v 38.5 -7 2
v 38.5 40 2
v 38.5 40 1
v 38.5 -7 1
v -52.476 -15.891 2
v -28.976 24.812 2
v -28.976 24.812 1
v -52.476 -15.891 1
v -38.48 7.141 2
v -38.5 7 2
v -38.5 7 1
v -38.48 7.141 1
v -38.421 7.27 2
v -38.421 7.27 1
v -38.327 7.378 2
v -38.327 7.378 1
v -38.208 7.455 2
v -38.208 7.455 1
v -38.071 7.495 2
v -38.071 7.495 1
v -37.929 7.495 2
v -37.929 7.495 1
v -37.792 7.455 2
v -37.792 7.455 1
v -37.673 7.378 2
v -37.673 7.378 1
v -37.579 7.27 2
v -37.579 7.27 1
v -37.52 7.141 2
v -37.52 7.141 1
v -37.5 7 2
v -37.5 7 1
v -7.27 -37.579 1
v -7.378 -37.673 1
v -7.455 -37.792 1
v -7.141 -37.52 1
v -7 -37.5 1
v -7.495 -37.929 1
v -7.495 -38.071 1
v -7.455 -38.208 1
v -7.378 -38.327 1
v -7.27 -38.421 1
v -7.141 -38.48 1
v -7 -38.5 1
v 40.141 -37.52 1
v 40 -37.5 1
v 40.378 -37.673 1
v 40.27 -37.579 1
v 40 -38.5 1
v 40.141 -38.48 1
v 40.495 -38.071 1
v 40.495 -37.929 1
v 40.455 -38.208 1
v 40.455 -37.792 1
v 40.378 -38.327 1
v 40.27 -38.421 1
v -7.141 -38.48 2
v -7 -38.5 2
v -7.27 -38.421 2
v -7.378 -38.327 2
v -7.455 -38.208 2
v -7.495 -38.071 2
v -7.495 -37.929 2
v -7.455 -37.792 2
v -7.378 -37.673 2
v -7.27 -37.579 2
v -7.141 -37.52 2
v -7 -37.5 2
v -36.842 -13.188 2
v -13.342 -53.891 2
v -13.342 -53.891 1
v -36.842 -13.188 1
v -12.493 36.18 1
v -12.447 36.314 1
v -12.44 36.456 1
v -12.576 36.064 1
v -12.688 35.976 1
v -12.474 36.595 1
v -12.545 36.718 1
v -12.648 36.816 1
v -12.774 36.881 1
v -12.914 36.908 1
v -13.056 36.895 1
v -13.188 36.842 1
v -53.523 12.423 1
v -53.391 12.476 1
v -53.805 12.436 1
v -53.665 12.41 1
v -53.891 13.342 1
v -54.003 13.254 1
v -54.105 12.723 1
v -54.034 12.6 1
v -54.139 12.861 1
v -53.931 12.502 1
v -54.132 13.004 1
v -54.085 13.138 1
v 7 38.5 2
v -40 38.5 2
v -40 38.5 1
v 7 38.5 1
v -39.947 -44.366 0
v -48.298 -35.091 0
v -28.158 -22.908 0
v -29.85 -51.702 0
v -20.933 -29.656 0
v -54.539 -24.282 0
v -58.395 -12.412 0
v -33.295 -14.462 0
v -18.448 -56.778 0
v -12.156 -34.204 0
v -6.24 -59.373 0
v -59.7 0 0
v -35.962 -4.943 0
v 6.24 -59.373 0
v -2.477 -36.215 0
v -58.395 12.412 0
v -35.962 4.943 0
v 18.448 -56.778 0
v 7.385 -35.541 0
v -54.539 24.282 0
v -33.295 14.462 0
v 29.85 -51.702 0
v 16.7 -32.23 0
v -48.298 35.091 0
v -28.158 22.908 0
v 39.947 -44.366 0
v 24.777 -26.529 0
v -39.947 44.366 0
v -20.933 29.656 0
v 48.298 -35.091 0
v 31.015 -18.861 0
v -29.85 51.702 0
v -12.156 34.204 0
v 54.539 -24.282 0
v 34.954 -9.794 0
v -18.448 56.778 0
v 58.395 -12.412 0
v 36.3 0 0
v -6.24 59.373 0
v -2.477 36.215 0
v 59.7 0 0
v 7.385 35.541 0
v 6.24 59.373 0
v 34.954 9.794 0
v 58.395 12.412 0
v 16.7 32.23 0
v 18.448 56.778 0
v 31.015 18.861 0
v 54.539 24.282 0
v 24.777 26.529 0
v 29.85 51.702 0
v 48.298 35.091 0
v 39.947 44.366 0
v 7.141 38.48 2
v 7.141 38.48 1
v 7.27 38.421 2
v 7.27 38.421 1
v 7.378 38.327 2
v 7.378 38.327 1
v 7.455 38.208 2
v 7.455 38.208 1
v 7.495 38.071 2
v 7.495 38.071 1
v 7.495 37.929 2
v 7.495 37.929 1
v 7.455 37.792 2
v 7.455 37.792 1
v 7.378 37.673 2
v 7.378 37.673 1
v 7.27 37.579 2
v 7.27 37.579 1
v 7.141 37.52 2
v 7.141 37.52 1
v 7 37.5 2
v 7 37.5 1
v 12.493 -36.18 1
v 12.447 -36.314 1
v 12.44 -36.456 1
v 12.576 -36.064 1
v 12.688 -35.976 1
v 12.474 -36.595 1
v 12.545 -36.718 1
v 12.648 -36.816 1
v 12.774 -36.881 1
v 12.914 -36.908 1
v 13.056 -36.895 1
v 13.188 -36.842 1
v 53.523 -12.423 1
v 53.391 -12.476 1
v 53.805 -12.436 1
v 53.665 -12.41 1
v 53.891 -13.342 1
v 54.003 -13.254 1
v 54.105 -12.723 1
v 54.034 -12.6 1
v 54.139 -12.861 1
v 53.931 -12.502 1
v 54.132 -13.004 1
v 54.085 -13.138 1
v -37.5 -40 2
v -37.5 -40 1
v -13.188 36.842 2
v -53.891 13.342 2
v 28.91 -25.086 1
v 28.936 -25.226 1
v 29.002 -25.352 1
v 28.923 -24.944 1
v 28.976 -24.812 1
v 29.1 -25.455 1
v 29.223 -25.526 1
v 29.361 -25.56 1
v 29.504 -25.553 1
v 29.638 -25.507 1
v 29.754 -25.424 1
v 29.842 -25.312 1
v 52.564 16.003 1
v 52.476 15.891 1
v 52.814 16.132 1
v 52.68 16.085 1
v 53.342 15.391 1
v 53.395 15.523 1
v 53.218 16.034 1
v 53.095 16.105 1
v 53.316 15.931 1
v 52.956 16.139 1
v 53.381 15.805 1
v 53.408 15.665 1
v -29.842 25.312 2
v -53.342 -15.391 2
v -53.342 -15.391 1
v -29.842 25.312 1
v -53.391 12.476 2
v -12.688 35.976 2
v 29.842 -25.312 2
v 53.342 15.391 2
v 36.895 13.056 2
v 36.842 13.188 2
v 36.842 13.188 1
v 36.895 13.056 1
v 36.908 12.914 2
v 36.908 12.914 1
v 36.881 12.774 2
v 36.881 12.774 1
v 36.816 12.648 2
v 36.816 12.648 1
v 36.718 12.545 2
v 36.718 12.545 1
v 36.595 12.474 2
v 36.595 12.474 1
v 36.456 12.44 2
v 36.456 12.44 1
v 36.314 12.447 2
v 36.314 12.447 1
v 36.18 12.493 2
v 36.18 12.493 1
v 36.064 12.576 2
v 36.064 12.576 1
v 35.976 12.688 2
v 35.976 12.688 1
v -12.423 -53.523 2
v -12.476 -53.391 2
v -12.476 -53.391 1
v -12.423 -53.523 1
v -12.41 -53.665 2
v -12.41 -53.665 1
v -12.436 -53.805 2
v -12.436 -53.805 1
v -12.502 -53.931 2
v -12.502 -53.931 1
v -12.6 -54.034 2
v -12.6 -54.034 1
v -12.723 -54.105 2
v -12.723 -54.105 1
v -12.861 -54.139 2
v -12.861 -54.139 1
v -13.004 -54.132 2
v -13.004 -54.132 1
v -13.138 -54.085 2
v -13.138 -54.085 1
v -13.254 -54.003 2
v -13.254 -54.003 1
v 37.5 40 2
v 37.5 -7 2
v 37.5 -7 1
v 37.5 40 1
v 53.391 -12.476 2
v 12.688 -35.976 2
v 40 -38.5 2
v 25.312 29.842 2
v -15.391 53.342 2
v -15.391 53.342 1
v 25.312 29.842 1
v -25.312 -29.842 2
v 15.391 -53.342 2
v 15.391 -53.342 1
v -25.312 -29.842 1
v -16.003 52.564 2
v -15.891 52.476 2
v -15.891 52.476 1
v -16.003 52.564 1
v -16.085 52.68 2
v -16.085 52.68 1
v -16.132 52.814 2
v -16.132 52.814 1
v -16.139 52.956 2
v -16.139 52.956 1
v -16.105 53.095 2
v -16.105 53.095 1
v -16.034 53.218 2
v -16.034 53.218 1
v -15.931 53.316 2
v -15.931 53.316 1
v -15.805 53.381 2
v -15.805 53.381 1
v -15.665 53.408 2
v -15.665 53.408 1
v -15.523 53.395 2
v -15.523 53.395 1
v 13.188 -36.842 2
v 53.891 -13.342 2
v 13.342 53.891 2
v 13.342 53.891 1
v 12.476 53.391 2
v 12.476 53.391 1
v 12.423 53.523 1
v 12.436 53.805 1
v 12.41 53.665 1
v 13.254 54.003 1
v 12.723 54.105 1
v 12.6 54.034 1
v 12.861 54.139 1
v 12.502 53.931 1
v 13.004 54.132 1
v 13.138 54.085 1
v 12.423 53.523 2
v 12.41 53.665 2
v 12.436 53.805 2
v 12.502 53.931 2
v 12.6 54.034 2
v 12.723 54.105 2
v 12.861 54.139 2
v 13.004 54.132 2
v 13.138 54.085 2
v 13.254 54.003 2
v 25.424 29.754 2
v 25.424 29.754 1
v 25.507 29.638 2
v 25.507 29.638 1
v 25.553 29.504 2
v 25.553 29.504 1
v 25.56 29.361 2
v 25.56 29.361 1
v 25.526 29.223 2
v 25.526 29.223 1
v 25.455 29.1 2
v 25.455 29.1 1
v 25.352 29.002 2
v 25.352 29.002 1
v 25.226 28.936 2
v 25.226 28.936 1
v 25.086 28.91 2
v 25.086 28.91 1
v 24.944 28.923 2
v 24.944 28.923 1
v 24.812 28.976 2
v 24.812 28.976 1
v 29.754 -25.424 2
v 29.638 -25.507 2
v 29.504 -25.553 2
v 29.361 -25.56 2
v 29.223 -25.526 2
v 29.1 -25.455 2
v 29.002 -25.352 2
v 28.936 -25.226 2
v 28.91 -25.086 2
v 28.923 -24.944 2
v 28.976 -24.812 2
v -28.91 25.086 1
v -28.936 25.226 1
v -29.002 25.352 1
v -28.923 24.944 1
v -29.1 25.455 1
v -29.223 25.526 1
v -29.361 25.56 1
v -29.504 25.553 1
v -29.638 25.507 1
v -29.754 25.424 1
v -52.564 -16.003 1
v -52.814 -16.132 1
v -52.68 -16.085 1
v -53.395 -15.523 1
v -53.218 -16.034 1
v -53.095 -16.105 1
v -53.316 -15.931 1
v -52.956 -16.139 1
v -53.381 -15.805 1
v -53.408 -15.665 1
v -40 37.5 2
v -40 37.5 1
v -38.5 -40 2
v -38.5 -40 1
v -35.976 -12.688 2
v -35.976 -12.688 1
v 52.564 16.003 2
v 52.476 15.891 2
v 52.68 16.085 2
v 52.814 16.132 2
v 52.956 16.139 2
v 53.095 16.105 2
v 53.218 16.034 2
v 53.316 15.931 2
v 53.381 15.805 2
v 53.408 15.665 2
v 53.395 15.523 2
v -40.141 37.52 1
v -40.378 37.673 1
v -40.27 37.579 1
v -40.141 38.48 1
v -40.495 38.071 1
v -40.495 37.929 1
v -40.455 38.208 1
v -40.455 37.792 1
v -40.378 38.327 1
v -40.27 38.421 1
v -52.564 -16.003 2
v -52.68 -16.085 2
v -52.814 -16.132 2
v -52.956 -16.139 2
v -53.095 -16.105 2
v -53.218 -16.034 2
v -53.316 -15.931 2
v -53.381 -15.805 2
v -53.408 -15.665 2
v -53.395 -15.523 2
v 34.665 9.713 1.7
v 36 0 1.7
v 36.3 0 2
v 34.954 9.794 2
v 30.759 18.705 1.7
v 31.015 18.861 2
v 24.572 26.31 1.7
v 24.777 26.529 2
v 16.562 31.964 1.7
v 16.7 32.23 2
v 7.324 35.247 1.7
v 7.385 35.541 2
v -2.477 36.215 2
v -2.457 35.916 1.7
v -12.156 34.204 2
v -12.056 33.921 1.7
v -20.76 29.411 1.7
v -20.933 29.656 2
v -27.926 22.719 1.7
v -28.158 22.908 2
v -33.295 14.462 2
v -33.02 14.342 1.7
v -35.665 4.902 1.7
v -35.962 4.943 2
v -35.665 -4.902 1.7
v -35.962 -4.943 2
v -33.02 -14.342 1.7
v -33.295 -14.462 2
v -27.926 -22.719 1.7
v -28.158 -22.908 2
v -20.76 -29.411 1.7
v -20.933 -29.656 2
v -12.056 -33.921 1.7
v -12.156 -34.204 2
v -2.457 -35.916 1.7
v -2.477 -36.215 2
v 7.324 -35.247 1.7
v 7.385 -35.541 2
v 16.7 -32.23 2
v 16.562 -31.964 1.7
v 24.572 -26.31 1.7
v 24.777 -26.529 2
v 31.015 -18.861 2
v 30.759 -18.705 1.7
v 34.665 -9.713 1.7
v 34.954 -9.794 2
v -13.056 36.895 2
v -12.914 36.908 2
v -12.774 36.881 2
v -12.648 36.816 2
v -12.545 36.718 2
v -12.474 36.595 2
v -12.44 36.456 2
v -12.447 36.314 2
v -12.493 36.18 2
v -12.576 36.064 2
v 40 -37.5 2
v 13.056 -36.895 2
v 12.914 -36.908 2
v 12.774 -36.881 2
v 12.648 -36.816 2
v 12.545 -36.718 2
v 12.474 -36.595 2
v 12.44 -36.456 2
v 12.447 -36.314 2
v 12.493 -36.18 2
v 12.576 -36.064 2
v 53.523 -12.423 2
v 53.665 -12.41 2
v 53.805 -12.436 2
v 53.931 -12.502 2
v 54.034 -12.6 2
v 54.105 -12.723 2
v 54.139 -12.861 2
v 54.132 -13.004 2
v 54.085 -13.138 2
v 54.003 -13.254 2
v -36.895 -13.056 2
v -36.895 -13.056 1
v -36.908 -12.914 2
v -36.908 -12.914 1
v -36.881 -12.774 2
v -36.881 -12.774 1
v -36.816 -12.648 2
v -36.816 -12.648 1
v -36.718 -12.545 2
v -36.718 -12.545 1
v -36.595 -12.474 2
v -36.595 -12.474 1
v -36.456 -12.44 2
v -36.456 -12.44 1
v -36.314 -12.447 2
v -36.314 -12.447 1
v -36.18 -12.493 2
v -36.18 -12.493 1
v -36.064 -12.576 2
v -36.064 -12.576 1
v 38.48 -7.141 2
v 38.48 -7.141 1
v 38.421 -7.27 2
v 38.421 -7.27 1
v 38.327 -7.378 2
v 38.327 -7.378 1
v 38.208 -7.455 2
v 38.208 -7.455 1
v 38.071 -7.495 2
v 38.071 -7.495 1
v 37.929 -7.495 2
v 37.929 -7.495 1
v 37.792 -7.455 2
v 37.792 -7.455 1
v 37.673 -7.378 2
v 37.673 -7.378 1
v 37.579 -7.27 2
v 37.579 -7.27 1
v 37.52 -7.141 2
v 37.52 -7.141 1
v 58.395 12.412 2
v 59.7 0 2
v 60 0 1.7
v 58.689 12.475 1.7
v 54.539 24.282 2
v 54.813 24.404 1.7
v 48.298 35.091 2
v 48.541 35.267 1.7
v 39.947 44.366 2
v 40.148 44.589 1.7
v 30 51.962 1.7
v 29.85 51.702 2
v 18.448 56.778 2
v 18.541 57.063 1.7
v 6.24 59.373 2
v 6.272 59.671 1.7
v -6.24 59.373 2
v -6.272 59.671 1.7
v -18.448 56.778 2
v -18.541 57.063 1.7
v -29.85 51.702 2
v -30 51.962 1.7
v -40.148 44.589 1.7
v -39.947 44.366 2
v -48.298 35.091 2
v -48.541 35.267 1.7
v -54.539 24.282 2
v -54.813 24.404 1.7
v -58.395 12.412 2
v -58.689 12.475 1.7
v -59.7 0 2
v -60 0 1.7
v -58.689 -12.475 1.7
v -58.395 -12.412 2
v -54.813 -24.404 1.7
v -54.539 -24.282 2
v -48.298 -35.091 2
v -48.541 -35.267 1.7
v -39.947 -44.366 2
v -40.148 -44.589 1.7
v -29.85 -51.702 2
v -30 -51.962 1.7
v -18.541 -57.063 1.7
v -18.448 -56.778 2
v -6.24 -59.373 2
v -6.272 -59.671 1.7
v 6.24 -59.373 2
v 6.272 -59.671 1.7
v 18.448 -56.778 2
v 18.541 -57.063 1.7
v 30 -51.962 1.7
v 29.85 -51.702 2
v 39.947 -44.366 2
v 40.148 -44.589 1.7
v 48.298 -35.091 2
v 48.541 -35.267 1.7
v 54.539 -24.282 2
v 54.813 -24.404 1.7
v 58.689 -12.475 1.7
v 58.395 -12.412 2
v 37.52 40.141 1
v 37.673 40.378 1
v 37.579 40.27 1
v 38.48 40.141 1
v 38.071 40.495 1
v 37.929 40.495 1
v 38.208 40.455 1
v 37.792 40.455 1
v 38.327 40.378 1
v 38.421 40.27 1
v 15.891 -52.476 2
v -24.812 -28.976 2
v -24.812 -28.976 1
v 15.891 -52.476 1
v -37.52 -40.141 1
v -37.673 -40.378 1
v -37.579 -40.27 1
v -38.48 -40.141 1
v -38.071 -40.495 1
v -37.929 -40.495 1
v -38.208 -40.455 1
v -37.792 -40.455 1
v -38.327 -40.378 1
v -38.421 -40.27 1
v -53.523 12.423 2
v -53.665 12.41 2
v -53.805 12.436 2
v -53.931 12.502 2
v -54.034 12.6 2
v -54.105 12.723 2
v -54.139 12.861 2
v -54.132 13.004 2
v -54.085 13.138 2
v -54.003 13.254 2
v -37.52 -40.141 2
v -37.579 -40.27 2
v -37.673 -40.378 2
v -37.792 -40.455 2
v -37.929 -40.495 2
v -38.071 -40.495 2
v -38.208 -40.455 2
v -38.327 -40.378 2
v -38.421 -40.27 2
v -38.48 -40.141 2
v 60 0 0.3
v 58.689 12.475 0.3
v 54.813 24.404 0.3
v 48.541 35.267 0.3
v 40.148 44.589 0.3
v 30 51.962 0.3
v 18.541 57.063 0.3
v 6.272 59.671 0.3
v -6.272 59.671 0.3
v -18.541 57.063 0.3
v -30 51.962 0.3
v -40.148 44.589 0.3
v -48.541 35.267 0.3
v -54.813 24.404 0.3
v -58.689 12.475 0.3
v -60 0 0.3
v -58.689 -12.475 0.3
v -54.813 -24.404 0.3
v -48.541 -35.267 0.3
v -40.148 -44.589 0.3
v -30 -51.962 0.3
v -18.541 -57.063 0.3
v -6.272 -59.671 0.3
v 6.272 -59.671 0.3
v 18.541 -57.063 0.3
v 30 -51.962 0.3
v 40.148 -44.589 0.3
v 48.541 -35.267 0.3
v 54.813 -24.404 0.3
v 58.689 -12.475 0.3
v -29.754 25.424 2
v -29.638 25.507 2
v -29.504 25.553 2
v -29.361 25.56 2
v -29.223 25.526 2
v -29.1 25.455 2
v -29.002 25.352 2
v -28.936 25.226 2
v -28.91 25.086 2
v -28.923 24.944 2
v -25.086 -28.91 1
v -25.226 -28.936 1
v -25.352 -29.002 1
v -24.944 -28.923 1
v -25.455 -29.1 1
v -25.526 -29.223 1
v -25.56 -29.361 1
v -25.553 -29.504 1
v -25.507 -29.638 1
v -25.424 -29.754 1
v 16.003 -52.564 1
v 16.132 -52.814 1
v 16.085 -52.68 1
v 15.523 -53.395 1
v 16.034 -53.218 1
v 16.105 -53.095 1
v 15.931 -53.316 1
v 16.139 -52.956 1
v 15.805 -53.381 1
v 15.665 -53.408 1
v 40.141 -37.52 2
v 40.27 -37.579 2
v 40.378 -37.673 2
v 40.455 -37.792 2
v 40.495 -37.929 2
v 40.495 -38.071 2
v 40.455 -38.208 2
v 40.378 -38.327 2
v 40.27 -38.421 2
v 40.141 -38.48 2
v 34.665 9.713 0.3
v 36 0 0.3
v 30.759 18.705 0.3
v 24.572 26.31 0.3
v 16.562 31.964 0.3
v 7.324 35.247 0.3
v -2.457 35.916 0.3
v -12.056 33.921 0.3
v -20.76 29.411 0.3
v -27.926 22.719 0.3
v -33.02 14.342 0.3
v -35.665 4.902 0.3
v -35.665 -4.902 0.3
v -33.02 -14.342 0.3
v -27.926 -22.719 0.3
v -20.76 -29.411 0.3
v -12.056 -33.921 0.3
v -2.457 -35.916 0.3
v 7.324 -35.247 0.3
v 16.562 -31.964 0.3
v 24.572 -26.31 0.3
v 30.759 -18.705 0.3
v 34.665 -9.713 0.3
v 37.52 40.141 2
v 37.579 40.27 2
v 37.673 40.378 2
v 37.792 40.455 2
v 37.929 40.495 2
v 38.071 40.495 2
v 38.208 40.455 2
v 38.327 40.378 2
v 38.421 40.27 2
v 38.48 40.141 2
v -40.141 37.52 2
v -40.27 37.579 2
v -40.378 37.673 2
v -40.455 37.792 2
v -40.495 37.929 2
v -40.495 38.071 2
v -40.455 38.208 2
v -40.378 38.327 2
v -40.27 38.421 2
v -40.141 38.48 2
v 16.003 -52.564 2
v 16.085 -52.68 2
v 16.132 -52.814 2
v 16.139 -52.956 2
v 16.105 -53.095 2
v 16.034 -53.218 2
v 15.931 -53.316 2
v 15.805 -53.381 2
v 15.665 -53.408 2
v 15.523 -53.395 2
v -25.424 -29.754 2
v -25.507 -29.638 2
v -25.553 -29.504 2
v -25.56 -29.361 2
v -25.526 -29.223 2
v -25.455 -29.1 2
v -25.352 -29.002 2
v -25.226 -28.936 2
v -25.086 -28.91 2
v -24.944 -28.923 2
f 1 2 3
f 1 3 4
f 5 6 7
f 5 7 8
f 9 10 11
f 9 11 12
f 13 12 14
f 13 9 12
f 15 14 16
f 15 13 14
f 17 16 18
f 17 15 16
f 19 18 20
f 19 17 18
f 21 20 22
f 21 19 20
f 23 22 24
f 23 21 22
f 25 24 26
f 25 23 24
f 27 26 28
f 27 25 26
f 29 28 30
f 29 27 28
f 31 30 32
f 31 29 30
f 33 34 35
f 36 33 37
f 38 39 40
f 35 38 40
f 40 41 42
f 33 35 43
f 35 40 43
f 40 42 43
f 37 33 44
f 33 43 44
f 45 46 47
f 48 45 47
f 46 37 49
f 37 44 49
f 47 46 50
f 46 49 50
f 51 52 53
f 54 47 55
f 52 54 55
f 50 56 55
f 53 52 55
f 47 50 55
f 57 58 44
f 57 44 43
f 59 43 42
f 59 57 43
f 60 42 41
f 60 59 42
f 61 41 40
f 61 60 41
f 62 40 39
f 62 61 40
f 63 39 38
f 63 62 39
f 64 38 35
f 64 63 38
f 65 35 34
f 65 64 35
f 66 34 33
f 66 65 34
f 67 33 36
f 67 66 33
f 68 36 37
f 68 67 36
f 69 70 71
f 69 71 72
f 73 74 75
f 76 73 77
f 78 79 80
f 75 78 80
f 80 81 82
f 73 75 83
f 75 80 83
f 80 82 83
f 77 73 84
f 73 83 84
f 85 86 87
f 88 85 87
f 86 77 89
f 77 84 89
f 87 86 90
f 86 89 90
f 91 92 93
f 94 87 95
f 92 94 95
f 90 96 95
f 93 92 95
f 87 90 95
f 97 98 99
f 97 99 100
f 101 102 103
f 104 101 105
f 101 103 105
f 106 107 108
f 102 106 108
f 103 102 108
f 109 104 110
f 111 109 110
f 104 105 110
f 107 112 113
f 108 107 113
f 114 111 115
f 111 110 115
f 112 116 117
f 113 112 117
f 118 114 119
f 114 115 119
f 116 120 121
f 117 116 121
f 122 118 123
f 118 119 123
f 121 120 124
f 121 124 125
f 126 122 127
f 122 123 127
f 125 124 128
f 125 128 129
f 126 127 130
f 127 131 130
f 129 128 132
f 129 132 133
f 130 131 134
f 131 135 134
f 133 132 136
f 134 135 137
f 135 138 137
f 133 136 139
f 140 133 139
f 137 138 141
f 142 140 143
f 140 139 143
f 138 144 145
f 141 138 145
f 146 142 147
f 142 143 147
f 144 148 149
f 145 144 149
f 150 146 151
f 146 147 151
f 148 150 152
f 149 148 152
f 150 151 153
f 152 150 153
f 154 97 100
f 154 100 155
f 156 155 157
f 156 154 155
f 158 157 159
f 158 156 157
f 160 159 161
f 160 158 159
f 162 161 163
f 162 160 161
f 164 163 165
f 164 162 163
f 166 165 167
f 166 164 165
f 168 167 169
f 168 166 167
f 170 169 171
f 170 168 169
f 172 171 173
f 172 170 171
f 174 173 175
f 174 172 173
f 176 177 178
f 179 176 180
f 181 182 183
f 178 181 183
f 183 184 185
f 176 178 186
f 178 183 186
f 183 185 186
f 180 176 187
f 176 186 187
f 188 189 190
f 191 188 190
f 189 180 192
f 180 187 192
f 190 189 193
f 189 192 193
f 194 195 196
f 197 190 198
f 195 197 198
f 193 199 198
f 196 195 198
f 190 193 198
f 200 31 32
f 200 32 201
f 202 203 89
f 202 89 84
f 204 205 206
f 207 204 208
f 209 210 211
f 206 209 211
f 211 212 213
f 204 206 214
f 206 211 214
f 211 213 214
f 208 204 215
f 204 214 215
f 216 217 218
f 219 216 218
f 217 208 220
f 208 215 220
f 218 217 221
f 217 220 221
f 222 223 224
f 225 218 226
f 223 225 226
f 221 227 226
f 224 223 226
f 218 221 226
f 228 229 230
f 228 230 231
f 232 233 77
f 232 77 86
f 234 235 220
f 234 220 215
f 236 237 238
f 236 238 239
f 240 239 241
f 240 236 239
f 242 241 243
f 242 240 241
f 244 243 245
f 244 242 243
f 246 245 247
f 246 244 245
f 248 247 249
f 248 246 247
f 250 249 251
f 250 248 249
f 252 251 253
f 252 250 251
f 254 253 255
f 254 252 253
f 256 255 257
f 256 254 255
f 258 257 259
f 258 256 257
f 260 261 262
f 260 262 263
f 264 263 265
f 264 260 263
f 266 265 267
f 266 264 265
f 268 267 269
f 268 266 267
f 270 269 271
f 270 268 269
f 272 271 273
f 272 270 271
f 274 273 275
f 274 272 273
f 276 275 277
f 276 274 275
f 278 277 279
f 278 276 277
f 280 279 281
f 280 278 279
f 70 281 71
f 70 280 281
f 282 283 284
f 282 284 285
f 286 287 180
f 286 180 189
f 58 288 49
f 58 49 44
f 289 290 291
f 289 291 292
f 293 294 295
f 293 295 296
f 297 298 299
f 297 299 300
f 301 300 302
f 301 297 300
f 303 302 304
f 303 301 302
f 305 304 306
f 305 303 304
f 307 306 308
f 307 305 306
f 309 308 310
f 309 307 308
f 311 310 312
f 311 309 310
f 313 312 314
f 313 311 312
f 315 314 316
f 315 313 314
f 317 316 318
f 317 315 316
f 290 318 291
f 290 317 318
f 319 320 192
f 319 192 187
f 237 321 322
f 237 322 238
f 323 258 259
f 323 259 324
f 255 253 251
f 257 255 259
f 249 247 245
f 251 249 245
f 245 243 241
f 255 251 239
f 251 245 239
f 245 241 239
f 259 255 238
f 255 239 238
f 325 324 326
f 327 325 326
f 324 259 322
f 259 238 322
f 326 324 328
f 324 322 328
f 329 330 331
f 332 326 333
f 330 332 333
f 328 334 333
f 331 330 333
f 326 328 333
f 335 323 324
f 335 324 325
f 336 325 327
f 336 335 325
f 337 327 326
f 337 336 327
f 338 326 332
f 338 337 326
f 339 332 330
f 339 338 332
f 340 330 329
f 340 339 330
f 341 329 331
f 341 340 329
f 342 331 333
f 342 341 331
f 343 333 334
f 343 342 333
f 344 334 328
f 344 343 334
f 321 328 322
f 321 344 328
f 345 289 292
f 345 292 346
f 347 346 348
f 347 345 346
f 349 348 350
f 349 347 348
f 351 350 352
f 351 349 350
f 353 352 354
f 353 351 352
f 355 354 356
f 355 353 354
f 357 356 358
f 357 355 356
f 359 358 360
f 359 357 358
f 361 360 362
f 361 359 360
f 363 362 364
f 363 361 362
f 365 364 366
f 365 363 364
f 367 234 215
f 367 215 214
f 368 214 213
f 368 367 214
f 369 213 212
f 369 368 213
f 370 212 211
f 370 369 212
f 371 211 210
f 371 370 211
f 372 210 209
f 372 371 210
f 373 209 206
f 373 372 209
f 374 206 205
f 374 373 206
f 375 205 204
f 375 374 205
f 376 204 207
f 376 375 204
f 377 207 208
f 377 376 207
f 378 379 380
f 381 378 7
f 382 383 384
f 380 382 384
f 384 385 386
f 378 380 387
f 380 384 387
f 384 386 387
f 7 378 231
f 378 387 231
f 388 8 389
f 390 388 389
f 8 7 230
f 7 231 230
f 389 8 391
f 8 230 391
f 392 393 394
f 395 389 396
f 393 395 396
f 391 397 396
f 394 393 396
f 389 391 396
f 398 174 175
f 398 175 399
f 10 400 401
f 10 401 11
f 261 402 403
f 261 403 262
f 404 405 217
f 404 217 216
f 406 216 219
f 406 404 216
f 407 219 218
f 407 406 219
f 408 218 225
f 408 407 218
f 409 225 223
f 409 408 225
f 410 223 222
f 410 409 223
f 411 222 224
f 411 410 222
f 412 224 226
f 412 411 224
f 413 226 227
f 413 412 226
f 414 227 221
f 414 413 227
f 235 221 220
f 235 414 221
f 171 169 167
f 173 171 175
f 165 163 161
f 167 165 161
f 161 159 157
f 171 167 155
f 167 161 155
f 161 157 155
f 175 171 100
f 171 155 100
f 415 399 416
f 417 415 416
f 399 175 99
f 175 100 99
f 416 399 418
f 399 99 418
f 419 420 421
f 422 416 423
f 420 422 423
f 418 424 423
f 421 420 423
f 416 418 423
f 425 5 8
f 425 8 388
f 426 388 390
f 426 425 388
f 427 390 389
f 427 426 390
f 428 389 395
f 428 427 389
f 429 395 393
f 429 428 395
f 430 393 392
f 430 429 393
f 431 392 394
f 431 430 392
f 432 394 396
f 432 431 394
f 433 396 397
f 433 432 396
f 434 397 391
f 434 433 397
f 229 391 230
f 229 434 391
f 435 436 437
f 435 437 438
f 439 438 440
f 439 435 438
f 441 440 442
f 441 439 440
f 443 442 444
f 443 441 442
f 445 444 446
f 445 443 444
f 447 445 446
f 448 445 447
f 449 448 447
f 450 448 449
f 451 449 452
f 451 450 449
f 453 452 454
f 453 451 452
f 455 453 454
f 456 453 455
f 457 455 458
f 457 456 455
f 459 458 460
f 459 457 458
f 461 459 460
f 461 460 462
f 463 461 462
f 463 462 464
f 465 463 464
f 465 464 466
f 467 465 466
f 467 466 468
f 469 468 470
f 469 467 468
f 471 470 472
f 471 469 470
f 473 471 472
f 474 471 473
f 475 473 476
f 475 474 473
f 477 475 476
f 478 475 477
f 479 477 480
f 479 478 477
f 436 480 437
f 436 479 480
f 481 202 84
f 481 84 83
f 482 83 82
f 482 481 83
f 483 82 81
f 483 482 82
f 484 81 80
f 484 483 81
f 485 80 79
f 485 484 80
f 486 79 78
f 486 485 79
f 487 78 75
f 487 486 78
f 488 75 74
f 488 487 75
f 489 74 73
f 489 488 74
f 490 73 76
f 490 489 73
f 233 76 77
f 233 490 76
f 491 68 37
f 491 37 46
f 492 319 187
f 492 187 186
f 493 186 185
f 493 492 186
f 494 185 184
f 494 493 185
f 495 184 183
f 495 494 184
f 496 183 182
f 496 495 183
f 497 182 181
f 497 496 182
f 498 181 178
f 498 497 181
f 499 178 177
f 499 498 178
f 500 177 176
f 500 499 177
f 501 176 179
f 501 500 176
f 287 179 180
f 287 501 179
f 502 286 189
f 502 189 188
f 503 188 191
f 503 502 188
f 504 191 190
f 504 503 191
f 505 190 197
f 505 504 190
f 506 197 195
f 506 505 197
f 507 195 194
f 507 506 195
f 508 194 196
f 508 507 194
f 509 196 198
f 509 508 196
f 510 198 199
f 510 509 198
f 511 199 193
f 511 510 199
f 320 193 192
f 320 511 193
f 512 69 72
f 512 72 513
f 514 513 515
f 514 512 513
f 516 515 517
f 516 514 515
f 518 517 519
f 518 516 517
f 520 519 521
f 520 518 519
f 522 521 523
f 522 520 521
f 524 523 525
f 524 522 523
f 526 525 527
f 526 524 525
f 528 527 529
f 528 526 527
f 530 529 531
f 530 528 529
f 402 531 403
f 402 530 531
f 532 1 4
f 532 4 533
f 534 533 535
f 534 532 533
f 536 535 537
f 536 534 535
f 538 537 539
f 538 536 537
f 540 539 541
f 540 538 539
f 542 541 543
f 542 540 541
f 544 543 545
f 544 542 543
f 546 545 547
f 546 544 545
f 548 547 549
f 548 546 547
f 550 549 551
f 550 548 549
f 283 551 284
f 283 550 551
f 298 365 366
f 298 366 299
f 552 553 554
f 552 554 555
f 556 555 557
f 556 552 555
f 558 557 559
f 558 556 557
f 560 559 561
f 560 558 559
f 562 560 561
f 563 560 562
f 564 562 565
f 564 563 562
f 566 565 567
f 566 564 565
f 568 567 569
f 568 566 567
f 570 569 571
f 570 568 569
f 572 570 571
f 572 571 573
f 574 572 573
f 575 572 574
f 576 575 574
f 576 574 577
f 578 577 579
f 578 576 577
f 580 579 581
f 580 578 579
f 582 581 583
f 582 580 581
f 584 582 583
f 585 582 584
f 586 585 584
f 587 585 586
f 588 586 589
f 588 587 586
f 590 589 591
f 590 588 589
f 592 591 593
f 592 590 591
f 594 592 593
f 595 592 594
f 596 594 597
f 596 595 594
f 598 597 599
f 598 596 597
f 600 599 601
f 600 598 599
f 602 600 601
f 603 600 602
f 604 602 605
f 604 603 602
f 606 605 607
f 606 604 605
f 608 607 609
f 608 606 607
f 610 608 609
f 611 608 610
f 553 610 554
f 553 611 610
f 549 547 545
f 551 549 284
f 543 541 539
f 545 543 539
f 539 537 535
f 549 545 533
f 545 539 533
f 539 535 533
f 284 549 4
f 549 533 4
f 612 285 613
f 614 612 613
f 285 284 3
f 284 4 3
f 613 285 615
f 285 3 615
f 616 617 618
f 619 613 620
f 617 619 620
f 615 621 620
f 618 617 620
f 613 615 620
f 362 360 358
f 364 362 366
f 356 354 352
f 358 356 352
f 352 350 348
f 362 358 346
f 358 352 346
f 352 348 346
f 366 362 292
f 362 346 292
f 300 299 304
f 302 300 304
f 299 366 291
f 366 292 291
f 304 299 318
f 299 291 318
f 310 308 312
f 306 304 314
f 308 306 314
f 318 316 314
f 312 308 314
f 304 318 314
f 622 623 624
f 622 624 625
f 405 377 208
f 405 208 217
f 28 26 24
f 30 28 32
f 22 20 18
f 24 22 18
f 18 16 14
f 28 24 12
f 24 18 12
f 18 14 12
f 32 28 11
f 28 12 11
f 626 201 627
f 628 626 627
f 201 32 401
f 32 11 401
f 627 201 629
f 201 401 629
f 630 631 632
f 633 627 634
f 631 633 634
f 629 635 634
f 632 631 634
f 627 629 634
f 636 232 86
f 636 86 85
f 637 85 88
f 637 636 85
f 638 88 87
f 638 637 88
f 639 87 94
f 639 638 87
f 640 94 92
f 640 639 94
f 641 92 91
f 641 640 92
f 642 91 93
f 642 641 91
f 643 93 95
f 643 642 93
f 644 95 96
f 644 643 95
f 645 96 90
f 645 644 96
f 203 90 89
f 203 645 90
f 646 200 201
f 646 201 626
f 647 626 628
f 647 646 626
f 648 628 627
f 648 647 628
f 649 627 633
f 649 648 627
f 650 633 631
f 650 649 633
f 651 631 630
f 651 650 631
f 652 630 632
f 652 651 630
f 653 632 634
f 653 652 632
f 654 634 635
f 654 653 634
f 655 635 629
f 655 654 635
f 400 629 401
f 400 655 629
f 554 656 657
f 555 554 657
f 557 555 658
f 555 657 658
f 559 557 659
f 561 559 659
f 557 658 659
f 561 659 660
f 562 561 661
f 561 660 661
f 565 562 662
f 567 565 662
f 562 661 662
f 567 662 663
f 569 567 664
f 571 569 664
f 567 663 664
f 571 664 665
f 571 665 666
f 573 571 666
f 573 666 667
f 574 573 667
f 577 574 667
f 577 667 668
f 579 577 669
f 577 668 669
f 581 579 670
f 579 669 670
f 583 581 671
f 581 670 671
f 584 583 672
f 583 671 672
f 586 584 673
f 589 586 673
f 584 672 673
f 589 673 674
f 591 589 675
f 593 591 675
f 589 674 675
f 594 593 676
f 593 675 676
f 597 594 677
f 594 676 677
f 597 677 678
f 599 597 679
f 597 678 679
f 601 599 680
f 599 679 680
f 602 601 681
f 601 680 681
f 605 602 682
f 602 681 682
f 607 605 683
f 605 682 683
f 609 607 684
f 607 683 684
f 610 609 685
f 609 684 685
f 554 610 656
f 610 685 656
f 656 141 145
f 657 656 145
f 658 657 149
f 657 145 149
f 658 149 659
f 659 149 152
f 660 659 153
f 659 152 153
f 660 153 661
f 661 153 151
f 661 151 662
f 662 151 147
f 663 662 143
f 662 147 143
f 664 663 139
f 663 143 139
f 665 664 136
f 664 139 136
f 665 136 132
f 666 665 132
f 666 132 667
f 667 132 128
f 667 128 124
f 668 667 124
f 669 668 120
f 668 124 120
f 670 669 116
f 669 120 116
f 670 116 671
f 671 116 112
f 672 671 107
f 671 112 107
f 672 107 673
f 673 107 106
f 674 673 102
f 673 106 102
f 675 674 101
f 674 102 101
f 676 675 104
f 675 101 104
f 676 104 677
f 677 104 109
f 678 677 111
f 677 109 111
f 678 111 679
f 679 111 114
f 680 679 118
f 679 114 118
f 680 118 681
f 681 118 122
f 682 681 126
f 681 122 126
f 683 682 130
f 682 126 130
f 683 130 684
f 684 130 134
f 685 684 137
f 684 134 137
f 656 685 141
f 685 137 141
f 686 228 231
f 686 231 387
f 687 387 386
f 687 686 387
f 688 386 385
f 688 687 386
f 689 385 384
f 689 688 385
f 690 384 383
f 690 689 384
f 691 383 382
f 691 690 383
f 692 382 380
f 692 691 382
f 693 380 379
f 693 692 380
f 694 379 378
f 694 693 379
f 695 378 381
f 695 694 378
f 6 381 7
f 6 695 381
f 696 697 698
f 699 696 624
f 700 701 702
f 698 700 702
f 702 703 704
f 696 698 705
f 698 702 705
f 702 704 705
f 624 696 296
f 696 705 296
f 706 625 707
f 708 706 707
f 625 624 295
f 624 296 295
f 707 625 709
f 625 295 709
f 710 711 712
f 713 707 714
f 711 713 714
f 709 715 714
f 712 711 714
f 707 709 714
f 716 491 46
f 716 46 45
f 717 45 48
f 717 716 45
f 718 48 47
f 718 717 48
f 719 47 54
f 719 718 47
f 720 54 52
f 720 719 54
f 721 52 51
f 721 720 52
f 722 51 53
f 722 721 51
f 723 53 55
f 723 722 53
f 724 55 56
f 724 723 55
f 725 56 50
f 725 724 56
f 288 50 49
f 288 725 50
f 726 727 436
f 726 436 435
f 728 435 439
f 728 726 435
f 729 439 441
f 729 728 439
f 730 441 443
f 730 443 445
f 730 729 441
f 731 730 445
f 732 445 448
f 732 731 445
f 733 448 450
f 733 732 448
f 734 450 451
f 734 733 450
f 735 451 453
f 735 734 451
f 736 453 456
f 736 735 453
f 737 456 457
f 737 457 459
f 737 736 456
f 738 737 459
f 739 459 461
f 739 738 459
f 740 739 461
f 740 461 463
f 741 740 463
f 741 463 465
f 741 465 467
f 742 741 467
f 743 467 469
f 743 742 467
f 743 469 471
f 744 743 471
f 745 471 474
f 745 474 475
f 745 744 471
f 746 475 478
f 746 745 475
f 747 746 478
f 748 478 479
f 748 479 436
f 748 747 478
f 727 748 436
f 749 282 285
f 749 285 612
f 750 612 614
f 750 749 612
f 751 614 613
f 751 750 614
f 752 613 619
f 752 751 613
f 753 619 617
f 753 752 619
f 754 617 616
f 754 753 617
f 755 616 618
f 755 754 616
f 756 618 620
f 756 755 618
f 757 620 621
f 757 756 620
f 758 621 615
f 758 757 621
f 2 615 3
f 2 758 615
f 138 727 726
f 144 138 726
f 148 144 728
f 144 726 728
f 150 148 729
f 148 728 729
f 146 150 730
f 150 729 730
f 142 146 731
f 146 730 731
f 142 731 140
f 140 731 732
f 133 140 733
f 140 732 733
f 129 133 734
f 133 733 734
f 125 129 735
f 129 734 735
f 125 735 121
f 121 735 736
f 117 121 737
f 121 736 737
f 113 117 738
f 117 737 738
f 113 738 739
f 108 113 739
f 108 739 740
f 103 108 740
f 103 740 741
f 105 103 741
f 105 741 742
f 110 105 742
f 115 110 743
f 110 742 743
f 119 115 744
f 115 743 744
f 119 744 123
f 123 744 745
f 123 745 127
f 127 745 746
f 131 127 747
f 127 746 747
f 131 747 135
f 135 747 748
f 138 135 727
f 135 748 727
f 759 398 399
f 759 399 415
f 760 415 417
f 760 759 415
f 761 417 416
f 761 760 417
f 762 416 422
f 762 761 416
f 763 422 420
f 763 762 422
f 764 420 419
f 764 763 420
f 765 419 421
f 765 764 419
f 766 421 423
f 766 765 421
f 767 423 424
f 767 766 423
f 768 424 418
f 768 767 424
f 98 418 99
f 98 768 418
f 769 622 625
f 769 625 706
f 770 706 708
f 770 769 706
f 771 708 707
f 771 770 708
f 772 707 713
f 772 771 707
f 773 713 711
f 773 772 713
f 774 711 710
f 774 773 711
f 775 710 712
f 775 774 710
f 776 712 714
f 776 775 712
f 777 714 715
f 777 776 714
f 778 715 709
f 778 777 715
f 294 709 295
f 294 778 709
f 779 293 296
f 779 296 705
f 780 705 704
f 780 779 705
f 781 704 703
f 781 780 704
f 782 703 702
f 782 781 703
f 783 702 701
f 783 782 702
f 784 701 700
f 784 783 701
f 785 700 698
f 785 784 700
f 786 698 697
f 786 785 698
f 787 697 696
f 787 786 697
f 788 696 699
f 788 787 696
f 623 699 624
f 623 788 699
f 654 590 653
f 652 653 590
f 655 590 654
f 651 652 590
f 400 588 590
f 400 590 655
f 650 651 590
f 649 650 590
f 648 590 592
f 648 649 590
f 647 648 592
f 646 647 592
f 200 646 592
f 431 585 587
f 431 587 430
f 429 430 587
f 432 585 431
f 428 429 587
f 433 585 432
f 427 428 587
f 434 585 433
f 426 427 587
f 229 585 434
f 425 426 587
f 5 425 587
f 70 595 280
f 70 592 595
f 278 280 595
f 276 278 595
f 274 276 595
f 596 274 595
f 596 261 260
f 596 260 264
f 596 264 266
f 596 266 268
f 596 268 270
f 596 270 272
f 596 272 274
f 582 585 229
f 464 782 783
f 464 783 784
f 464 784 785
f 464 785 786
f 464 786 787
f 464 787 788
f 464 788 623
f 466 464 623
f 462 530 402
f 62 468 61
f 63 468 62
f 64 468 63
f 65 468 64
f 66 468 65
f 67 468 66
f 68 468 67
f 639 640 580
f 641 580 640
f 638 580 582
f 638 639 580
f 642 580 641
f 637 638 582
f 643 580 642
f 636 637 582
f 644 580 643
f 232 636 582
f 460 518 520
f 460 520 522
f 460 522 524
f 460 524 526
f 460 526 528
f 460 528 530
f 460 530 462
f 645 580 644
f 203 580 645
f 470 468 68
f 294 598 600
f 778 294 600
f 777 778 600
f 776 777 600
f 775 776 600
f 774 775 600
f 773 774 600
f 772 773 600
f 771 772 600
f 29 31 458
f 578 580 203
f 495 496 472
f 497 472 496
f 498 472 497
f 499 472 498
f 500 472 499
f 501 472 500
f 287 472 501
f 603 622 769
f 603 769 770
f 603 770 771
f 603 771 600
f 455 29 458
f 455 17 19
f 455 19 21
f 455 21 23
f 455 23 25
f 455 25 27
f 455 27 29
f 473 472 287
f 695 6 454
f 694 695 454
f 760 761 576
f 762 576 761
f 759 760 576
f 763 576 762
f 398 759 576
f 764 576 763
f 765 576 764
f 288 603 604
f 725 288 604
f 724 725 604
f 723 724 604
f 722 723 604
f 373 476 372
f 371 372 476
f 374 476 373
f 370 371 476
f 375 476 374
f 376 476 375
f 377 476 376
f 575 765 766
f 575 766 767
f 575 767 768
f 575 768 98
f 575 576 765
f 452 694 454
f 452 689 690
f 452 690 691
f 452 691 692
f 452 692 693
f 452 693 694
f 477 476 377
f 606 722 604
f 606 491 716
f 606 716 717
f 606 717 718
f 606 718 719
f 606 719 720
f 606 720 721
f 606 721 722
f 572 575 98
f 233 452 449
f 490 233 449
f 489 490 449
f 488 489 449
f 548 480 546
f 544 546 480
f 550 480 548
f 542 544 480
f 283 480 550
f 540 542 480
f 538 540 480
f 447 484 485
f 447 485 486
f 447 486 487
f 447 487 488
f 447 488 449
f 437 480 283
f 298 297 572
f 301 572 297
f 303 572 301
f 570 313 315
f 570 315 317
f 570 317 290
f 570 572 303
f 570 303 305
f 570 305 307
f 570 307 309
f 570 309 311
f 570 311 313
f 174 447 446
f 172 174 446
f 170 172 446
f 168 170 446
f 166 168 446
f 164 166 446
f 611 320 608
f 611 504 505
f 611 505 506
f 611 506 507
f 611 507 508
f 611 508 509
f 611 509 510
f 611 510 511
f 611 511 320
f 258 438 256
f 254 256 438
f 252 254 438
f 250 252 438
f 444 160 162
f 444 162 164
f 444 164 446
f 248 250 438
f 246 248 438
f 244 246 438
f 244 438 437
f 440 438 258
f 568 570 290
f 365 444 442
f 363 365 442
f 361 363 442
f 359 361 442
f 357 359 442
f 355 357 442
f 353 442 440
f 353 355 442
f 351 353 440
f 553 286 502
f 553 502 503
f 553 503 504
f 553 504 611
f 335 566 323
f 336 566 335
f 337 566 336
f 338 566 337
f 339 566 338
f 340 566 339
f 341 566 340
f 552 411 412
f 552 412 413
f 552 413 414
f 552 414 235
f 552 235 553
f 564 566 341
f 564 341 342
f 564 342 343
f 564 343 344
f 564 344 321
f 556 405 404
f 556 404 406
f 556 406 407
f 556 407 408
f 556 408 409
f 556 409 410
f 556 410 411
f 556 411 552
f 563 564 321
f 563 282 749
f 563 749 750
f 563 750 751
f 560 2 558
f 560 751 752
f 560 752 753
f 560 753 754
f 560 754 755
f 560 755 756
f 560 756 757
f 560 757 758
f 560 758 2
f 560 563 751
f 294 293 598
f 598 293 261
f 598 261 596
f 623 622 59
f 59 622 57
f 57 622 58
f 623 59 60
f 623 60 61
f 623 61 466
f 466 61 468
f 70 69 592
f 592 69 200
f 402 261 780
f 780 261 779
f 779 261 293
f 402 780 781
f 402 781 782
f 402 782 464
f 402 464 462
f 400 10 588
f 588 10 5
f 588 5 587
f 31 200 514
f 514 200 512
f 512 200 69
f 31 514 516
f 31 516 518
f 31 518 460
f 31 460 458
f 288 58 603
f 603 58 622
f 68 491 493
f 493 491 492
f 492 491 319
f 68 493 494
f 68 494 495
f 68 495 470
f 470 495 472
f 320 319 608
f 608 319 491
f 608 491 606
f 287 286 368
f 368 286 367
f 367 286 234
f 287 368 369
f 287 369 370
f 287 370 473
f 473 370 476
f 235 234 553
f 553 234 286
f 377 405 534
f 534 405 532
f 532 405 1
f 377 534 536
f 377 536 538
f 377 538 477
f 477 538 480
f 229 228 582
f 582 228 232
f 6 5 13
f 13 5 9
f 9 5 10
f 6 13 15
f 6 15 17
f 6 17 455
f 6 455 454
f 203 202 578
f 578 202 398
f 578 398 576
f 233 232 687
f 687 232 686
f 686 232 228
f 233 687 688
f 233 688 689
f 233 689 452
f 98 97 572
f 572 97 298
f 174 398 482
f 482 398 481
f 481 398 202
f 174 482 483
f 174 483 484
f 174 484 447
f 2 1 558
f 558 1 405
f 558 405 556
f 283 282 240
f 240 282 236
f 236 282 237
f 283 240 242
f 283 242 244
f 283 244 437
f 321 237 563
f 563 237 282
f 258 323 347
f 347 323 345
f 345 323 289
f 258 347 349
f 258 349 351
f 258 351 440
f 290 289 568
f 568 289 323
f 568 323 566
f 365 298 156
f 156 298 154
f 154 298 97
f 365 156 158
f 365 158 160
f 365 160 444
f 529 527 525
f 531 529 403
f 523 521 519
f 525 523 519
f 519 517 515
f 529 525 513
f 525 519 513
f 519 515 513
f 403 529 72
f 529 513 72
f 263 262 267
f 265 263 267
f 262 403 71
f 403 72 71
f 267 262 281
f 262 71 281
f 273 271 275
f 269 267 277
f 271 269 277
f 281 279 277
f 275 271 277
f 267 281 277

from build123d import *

# Parameters (mm, degrees)
SKETCH1_R           = 60
SKETCH1_R_2         = 36
BOSS_EXTRUDE1_DEPTH = 2
CUT_EXTRUDE1_DEPTH  = 1
CIRPATTERN1_COUNT   = 12
CHAMFER1_SIZE       = 0.3


with BuildPart() as part:
    # Sketch1 → Boss-Extrude1 (new body)
    with BuildSketch(Plane.XY):
        Circle(SKETCH1_R)
        Circle(SKETCH1_R_2, mode=Mode.SUBTRACT)
    extrude(amount=BOSS_EXTRUDE1_DEPTH)

    # Sketch2 → Cut-Extrude1 (cut)
    with BuildSketch(Plane.XY.offset(2)):
        with BuildLine():
            Line((-40, 38.5), (7, 38.5))
            ThreePointArc((7, 38.5), (7.5, 38), (7, 37.5))
            Line((7, 37.5), (-40, 37.5))
            ThreePointArc((-40, 37.5), (-40.5, 38), (-40, 38.5))
        make_face()
    cut_extrude1 = extrude(amount=-CUT_EXTRUDE1_DEPTH, mode=Mode.SUBTRACT)

    # CirPattern1: Cut-Extrude1 ×12 about axis
    cirpattern1_axis = Axis((0, 0, 0), (0, 0, 1))
    for i in range(1, CIRPATTERN1_COUNT):
        add(cut_extrude1.rotate(cirpattern1_axis, i * 360 / CIRPATTERN1_COUNT), mode=Mode.SUBTRACT)

    # Chamfer1
    chamfer1_edges = [part.edges().sort_by_distance(p)[0] for p in [
        (-60, 0, 0),
        (-60, 0, 2),
        (-36, 0, 0),
        (-36, 0, 2),
    ]]
    chamfer(chamfer1_edges, length=CHAMFER1_SIZE)


solid = part.part
